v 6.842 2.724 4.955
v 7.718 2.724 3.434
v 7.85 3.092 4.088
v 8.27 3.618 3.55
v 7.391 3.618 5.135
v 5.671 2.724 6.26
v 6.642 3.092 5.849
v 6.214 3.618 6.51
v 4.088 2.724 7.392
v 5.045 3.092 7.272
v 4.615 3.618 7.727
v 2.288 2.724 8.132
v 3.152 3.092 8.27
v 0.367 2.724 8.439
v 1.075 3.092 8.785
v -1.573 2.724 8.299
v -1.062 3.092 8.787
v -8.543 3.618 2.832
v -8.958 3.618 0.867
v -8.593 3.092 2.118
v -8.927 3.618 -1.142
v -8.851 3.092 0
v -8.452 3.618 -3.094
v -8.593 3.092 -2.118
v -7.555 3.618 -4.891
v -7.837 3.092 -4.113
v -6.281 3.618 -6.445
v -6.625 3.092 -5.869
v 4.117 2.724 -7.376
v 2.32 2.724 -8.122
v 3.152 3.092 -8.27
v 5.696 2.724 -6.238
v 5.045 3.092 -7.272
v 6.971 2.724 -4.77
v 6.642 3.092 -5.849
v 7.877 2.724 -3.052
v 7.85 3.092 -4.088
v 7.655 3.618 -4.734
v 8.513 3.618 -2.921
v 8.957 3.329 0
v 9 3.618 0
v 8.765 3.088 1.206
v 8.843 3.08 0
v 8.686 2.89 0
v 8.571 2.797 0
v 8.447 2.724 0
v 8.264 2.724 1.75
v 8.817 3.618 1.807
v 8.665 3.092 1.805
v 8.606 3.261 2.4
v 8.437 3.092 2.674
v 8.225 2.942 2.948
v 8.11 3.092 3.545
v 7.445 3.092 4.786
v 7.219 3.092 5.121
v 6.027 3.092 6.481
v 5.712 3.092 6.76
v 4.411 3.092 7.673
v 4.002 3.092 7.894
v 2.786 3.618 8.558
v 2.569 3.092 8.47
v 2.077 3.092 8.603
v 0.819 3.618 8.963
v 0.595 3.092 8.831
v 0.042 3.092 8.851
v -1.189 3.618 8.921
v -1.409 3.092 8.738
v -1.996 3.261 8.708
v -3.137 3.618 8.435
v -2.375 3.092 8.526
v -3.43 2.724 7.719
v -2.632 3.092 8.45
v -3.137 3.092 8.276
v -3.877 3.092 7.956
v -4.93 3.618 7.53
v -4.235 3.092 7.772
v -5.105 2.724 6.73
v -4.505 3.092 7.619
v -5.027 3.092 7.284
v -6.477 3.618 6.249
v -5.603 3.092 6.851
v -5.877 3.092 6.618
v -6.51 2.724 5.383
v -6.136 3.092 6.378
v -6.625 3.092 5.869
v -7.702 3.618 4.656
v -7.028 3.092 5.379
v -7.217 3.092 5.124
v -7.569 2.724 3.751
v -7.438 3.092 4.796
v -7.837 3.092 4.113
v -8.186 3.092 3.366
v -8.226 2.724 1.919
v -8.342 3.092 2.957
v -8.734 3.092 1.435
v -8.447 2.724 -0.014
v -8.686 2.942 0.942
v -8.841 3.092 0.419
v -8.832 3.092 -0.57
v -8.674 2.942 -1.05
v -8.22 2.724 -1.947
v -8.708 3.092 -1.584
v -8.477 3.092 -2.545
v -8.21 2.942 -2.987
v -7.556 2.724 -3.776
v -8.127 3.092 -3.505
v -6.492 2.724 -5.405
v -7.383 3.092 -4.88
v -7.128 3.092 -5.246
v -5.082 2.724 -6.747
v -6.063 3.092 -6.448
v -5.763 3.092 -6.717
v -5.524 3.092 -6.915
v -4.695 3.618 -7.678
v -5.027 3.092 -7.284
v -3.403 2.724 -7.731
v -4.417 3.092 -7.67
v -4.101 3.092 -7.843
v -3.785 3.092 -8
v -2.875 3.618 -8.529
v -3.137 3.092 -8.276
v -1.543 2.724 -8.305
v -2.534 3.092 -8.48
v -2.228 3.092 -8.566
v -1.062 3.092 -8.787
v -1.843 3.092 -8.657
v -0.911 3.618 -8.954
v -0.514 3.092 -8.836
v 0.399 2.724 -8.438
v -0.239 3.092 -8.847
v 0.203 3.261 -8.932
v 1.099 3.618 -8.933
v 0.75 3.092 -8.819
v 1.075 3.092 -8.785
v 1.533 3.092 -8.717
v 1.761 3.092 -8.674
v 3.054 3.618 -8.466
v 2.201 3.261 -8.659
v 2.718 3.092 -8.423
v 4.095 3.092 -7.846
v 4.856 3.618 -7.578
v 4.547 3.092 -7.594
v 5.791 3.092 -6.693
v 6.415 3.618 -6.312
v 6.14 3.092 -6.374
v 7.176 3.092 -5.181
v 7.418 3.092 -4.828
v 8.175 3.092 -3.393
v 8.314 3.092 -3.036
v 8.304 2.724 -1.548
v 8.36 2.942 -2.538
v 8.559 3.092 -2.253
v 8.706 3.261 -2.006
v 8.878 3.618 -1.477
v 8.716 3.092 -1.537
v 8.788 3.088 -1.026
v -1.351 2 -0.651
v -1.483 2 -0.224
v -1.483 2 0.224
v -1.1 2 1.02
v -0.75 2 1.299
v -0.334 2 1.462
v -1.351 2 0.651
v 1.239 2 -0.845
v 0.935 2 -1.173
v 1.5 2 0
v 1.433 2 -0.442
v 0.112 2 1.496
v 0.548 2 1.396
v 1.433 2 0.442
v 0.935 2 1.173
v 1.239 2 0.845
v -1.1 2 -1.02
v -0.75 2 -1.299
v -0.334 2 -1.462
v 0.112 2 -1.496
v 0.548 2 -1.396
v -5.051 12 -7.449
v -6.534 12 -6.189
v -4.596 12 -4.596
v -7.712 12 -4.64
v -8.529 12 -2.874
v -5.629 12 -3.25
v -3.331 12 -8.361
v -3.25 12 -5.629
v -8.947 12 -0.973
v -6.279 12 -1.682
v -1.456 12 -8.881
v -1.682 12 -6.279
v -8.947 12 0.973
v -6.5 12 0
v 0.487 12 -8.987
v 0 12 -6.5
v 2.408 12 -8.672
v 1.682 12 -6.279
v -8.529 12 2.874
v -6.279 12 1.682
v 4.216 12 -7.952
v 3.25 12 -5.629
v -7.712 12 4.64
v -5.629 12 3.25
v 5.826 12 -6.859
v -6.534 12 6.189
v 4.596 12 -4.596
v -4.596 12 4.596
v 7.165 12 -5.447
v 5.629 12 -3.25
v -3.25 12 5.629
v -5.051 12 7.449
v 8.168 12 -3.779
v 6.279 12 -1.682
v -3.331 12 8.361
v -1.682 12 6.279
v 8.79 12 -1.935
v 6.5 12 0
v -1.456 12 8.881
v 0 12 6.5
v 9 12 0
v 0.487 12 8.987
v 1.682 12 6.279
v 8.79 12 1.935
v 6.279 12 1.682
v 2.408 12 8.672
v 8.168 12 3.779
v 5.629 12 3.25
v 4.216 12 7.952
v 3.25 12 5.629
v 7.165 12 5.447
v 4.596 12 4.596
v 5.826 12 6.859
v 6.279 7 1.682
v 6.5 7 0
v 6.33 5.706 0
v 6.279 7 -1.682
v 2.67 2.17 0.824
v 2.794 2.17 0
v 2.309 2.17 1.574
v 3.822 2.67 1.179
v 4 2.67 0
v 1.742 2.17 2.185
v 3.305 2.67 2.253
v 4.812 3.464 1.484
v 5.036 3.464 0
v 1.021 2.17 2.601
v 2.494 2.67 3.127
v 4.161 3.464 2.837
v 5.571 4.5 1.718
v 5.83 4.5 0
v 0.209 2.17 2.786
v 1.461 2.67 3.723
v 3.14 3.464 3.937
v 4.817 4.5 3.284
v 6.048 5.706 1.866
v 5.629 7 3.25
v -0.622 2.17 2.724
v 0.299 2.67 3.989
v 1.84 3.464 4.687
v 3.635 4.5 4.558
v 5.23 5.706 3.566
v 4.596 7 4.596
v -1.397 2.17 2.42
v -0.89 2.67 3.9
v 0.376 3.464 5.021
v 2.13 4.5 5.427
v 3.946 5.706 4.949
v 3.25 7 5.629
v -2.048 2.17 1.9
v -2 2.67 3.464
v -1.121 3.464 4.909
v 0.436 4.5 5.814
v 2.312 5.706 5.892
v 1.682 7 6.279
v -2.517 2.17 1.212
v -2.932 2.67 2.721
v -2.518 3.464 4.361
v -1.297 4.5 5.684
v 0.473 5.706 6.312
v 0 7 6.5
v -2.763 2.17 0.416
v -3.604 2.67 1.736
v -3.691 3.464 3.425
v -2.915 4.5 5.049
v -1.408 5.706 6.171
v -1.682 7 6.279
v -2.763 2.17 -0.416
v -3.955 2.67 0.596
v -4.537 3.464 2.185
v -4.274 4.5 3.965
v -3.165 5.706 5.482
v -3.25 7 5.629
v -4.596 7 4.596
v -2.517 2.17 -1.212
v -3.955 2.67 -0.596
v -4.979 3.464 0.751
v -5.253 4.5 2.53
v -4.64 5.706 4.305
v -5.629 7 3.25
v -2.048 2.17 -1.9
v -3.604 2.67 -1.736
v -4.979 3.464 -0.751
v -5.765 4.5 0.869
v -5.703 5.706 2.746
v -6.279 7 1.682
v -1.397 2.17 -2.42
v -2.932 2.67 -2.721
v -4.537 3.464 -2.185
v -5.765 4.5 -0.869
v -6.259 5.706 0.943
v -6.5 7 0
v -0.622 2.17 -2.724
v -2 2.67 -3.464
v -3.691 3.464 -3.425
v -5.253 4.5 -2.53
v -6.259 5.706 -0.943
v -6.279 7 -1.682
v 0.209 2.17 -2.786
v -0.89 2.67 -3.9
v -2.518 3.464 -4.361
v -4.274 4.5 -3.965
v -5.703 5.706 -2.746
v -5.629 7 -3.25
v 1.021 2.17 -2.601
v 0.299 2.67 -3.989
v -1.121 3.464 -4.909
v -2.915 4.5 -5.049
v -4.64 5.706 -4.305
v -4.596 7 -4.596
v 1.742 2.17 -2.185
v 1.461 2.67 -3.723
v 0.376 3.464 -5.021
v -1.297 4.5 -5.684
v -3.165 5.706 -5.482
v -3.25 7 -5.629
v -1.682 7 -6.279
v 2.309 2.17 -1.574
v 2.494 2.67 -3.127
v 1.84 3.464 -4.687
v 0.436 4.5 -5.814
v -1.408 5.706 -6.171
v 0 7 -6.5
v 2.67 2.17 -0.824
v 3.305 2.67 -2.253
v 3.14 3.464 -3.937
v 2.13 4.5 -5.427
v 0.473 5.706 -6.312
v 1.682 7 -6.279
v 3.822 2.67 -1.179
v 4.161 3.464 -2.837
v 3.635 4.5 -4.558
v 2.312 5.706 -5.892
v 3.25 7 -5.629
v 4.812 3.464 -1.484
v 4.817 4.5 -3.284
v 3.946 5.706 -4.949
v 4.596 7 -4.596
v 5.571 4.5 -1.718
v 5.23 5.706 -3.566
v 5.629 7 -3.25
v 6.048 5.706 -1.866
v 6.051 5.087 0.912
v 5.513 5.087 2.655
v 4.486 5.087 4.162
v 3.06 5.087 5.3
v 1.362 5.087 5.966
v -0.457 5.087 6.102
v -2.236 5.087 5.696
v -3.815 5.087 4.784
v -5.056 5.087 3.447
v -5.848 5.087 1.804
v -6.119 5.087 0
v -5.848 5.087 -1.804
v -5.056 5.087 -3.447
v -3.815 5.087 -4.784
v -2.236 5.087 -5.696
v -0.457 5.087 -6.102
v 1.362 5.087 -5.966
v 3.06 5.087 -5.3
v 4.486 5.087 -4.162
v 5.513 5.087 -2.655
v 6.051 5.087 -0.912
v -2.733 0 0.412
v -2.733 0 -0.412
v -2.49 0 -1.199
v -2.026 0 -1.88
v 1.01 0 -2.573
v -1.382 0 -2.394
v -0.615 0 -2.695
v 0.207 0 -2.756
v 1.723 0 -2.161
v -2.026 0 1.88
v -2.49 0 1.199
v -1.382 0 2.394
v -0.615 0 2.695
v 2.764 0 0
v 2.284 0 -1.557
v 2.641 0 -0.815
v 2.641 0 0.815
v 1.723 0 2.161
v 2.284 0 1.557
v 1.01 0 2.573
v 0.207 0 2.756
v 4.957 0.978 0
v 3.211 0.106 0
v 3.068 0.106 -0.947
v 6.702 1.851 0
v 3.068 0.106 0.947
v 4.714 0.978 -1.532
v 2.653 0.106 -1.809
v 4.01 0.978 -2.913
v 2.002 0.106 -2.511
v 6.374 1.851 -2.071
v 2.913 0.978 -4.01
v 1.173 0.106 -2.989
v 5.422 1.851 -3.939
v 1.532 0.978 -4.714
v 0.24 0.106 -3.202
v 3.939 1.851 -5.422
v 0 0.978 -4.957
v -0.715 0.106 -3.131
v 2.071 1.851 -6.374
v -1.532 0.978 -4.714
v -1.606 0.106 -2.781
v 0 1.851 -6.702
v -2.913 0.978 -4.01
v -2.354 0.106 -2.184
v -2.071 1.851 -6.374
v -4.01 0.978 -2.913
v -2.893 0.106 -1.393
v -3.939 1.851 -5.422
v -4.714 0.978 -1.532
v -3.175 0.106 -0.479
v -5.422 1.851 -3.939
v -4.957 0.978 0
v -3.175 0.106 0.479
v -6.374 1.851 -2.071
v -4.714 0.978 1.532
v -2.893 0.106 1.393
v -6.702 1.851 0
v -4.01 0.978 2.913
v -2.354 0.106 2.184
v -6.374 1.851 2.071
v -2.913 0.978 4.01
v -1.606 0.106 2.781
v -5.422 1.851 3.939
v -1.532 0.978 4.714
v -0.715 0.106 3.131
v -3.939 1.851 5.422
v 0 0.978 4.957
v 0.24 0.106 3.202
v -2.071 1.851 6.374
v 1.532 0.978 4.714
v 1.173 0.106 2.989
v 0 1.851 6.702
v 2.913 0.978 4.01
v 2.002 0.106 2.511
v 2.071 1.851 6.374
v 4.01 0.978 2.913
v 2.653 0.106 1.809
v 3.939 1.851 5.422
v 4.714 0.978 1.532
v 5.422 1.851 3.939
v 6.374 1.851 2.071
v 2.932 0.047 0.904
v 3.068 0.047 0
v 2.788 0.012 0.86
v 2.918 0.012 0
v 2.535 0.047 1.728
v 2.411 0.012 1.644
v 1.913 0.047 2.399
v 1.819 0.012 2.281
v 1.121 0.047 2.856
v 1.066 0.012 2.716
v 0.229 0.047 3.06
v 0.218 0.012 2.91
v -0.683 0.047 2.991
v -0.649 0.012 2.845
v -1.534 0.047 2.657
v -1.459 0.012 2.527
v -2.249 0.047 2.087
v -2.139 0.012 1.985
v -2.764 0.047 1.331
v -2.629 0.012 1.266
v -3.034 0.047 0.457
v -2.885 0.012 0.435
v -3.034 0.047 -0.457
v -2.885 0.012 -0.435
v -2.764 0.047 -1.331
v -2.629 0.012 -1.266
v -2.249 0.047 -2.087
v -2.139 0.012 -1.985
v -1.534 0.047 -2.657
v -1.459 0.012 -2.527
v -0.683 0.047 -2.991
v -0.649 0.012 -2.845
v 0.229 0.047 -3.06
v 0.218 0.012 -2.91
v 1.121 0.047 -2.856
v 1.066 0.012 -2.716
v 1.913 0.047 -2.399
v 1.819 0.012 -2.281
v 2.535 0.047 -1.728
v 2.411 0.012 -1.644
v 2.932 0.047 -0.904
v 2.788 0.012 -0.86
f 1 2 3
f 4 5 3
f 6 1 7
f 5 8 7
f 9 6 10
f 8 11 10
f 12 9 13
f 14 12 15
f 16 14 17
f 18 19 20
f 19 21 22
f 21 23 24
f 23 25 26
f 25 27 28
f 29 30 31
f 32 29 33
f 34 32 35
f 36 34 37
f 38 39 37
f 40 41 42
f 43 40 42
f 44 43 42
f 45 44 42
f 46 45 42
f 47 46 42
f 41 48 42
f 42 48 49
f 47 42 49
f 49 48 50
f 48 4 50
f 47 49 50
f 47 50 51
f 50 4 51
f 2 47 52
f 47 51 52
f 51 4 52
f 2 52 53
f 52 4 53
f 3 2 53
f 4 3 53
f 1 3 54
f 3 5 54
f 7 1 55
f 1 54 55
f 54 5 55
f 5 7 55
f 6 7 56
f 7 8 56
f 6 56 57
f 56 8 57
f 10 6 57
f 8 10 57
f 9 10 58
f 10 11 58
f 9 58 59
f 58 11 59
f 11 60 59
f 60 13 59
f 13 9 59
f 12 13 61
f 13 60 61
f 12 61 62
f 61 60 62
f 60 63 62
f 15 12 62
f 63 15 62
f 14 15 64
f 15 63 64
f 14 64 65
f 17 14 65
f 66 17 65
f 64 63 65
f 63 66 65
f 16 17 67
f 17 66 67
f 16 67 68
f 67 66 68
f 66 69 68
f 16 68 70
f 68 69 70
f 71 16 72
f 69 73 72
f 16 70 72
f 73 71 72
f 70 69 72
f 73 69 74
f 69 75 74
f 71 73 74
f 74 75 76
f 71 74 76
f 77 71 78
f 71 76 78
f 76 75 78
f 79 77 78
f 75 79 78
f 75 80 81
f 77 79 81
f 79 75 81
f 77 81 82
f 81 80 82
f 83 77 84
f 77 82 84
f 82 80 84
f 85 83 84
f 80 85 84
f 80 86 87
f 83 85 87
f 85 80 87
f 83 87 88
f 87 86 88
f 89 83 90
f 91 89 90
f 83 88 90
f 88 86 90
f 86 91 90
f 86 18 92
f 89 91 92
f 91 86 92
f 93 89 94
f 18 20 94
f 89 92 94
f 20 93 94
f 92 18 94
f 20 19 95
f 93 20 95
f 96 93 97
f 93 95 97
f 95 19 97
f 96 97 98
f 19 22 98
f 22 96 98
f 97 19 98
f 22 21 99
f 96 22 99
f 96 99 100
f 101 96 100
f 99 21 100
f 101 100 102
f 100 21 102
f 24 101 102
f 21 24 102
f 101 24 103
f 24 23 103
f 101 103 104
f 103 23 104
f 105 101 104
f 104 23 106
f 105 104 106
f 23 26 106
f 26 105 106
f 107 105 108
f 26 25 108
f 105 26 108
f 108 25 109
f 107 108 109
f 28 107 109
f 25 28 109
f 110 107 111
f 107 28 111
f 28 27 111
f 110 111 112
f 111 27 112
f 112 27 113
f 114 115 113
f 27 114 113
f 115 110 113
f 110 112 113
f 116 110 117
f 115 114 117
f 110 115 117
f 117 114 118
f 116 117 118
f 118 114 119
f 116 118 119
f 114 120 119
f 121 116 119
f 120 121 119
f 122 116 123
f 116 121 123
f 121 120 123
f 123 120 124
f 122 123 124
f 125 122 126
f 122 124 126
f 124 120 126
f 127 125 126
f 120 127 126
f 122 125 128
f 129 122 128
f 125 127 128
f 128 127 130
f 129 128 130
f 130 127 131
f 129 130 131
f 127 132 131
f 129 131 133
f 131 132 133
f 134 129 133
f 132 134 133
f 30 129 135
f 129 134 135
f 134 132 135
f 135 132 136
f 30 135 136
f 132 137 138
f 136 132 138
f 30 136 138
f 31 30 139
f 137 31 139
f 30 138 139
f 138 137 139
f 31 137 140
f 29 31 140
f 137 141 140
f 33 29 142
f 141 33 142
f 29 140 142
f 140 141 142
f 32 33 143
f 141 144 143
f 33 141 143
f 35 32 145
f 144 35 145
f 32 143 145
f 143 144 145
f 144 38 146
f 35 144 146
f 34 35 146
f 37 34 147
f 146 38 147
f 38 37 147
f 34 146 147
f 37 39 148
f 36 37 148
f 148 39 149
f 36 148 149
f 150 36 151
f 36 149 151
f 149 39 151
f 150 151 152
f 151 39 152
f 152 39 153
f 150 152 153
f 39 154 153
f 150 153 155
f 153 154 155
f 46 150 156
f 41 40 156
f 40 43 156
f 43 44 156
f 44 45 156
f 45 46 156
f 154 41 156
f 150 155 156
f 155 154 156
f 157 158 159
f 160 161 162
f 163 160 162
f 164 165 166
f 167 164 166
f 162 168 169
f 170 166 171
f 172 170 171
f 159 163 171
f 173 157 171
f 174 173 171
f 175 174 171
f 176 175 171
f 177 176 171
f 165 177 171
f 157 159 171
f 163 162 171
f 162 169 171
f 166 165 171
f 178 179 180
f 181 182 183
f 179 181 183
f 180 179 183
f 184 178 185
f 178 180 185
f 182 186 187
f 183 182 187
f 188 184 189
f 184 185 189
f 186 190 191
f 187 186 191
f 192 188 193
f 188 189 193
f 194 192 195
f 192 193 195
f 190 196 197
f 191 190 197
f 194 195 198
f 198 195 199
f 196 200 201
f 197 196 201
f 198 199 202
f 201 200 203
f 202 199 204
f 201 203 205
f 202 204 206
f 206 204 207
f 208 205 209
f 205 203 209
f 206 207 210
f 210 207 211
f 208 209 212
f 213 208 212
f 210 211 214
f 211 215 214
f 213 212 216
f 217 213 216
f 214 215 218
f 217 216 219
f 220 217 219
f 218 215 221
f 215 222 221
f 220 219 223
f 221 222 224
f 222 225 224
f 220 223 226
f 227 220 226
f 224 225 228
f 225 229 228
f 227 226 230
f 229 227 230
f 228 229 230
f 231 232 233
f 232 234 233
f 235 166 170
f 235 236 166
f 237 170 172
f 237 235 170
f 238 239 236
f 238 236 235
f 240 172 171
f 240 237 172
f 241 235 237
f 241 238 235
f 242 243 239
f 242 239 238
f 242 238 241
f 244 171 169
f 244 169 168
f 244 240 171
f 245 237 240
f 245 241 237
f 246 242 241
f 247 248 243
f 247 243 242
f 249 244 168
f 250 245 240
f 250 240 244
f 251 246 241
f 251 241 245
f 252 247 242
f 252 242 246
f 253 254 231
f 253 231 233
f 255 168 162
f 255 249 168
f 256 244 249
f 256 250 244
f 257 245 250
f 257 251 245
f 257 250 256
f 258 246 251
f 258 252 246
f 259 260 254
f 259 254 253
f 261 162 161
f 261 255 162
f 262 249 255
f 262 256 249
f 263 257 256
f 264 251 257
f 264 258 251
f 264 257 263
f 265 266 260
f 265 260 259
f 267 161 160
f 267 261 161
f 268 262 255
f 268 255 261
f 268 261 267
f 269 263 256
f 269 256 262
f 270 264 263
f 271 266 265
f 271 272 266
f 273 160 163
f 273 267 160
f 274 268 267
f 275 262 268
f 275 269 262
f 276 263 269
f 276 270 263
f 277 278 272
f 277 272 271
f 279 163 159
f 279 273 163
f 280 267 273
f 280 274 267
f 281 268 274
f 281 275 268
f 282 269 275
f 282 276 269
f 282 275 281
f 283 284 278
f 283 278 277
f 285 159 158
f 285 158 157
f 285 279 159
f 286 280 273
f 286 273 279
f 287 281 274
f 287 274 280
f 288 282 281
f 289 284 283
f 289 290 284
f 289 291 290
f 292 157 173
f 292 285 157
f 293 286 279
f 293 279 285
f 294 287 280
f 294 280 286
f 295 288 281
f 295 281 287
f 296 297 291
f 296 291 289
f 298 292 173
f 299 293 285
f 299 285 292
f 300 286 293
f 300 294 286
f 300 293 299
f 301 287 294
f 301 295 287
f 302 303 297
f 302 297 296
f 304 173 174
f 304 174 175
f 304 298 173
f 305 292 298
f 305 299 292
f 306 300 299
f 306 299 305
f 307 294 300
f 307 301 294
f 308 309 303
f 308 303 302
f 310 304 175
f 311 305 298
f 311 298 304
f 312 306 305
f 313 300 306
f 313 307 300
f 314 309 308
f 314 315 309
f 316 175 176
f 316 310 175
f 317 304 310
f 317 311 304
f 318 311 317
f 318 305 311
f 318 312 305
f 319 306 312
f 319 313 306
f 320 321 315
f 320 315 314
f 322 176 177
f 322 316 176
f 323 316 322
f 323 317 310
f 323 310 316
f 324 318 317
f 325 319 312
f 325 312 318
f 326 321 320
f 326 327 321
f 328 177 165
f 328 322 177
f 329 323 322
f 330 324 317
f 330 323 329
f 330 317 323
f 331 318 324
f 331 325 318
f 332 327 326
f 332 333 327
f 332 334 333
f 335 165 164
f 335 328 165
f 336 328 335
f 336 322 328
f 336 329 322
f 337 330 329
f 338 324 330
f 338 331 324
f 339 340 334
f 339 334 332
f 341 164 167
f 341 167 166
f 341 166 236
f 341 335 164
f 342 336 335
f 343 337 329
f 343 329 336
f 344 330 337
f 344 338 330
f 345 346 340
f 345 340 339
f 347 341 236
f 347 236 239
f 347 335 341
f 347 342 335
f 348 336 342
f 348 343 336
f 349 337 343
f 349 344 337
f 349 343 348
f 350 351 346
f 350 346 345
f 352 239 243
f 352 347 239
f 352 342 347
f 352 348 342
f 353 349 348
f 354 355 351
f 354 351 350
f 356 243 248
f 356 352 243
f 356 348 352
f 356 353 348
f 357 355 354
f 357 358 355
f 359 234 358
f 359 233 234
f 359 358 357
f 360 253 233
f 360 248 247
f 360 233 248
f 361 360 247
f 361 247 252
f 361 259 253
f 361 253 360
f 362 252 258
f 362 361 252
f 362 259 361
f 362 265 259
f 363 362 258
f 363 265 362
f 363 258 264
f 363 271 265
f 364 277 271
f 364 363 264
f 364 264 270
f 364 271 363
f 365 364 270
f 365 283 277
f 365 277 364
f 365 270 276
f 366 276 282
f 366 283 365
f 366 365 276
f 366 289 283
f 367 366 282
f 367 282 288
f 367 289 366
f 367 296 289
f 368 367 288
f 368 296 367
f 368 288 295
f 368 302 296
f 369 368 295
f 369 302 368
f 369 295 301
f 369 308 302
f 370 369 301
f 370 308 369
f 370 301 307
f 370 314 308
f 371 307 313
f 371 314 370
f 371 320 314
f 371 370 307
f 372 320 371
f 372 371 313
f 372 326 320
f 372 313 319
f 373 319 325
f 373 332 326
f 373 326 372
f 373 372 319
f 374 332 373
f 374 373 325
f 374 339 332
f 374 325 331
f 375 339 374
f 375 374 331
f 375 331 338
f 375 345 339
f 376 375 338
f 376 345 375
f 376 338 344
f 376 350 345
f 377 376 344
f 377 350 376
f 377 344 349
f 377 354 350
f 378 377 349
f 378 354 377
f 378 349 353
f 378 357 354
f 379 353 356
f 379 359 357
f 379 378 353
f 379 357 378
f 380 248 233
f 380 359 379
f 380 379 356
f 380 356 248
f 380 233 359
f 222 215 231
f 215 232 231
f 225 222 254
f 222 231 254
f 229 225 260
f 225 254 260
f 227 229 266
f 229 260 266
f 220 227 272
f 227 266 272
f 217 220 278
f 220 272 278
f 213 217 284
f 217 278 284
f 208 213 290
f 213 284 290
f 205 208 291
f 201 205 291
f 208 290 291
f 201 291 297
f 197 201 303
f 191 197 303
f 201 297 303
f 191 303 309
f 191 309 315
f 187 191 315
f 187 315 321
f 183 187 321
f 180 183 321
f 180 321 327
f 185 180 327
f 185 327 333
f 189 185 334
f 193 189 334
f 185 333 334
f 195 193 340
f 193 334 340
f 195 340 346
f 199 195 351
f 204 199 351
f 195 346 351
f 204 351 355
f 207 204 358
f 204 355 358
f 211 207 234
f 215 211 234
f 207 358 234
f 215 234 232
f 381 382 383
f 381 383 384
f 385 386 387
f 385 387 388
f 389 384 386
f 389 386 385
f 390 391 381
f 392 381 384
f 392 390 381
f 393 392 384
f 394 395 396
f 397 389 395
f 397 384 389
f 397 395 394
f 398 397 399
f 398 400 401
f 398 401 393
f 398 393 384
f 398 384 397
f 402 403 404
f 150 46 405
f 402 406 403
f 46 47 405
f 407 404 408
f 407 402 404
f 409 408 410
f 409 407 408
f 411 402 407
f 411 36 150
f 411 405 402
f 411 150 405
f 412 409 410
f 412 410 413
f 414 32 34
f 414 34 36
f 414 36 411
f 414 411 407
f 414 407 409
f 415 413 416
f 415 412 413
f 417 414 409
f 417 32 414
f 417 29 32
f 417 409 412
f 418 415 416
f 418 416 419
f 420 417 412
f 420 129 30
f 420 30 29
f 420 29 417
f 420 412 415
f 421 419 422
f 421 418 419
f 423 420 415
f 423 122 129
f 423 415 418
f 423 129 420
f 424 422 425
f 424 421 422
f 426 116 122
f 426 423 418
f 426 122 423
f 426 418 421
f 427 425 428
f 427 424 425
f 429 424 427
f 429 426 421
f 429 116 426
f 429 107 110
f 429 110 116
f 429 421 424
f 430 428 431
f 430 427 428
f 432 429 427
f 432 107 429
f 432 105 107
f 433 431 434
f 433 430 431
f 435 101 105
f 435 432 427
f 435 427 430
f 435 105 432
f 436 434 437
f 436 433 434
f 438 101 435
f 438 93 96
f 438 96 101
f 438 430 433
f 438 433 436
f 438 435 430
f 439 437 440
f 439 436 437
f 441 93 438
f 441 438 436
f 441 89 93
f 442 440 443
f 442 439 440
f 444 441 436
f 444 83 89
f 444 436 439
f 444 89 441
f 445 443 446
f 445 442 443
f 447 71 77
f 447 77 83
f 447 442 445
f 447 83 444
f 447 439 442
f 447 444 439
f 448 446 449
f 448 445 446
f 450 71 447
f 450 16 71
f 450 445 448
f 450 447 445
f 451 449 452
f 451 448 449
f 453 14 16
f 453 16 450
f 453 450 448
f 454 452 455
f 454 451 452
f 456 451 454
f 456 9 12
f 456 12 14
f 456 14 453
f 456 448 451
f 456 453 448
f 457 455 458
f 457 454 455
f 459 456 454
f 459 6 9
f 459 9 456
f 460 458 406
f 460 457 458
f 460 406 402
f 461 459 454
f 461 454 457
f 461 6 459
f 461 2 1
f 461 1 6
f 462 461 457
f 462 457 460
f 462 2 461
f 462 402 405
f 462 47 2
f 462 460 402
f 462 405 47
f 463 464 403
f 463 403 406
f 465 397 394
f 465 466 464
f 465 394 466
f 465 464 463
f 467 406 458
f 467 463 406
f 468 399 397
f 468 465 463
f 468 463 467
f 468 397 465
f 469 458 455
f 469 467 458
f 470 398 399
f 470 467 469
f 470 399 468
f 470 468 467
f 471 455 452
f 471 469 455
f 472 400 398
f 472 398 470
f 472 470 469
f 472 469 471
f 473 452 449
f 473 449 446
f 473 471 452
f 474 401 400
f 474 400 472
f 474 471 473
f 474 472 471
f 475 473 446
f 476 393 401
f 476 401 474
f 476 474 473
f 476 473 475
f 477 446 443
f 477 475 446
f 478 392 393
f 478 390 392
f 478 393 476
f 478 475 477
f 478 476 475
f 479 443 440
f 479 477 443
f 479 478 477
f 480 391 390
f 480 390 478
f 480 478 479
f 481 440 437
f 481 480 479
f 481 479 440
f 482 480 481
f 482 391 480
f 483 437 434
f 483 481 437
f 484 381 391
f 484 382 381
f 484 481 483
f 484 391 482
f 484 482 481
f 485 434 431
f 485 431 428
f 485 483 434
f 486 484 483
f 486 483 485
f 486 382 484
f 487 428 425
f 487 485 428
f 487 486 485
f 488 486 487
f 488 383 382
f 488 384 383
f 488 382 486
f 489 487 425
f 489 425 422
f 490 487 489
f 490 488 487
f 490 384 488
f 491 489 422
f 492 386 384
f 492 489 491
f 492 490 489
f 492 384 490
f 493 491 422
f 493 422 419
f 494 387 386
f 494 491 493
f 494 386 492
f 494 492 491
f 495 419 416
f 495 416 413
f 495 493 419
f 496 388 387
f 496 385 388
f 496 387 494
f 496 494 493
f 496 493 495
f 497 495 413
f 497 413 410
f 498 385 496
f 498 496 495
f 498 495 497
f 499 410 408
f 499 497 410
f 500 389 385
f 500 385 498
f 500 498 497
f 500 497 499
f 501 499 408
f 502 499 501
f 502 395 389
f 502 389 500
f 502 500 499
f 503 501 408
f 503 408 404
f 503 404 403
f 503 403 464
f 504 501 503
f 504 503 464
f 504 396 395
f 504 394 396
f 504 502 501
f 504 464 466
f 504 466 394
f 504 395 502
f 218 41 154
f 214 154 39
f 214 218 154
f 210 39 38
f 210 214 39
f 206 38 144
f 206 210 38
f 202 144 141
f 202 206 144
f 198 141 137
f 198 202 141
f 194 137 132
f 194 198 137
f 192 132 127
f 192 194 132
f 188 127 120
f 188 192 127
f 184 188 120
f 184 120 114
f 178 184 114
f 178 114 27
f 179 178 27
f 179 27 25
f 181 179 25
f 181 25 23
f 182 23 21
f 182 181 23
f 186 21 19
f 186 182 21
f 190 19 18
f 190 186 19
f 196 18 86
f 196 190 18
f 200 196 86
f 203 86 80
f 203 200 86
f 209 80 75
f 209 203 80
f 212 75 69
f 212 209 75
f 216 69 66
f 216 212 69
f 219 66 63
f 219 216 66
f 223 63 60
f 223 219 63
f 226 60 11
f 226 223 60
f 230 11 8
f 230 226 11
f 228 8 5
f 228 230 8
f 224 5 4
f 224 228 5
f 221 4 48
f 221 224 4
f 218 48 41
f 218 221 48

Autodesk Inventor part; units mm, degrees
ref_plane "YZ Plane" through (0, 0, 0) normal (1, 0, 0) x (0, 1, 0)
ref_plane "XZ Plane" through (0, 0, 0) normal (0, 1, 0) x (-1, 0, 0)
ref_plane "XY Plane" through (0, 0, 0) normal (0, 0, 1) x (1, 0, 0)
sketch "Эскиз1" plane through (0, 0, 0) normal (0, 0, 1) x (1, 0, 0)
  line L0 (0, 0) -> (3, 0)
  line L1 (3, 0) -> (9, 3)
  line L2 (9, 3) -> (9, 12)
  line L3 (9, 12) -> (6.5, 12)
  line L4 (6.5, 12) -> (6.5, 7)
  line L5 (0, 2) -> (0, 0)
  line L6 (0, 2) -> (1.5, 2)
  arc A0 (1.5, 2) -> (6.5, 7) centre (1.5, 7) ccw
  dimension "d0" = 18
  dimension "d2" = 13
  dimension "d3" = 12
  dimension "d4" = 9
  dimension "d5" = 6
  dimension "d6" = 10
  dimension "d9" = 1.5
  dimension "d10" = 5
revolve "Вращение1" add sketch "Эскиз1" angle 360 about axis through (0, 2, 0) along (0, -1, 0)
fillet "Сопряжение1" radius 1 2 edges at (-9, 3, 0) (-3, 0, 0)
properties part number "paris_pivot_cup"
